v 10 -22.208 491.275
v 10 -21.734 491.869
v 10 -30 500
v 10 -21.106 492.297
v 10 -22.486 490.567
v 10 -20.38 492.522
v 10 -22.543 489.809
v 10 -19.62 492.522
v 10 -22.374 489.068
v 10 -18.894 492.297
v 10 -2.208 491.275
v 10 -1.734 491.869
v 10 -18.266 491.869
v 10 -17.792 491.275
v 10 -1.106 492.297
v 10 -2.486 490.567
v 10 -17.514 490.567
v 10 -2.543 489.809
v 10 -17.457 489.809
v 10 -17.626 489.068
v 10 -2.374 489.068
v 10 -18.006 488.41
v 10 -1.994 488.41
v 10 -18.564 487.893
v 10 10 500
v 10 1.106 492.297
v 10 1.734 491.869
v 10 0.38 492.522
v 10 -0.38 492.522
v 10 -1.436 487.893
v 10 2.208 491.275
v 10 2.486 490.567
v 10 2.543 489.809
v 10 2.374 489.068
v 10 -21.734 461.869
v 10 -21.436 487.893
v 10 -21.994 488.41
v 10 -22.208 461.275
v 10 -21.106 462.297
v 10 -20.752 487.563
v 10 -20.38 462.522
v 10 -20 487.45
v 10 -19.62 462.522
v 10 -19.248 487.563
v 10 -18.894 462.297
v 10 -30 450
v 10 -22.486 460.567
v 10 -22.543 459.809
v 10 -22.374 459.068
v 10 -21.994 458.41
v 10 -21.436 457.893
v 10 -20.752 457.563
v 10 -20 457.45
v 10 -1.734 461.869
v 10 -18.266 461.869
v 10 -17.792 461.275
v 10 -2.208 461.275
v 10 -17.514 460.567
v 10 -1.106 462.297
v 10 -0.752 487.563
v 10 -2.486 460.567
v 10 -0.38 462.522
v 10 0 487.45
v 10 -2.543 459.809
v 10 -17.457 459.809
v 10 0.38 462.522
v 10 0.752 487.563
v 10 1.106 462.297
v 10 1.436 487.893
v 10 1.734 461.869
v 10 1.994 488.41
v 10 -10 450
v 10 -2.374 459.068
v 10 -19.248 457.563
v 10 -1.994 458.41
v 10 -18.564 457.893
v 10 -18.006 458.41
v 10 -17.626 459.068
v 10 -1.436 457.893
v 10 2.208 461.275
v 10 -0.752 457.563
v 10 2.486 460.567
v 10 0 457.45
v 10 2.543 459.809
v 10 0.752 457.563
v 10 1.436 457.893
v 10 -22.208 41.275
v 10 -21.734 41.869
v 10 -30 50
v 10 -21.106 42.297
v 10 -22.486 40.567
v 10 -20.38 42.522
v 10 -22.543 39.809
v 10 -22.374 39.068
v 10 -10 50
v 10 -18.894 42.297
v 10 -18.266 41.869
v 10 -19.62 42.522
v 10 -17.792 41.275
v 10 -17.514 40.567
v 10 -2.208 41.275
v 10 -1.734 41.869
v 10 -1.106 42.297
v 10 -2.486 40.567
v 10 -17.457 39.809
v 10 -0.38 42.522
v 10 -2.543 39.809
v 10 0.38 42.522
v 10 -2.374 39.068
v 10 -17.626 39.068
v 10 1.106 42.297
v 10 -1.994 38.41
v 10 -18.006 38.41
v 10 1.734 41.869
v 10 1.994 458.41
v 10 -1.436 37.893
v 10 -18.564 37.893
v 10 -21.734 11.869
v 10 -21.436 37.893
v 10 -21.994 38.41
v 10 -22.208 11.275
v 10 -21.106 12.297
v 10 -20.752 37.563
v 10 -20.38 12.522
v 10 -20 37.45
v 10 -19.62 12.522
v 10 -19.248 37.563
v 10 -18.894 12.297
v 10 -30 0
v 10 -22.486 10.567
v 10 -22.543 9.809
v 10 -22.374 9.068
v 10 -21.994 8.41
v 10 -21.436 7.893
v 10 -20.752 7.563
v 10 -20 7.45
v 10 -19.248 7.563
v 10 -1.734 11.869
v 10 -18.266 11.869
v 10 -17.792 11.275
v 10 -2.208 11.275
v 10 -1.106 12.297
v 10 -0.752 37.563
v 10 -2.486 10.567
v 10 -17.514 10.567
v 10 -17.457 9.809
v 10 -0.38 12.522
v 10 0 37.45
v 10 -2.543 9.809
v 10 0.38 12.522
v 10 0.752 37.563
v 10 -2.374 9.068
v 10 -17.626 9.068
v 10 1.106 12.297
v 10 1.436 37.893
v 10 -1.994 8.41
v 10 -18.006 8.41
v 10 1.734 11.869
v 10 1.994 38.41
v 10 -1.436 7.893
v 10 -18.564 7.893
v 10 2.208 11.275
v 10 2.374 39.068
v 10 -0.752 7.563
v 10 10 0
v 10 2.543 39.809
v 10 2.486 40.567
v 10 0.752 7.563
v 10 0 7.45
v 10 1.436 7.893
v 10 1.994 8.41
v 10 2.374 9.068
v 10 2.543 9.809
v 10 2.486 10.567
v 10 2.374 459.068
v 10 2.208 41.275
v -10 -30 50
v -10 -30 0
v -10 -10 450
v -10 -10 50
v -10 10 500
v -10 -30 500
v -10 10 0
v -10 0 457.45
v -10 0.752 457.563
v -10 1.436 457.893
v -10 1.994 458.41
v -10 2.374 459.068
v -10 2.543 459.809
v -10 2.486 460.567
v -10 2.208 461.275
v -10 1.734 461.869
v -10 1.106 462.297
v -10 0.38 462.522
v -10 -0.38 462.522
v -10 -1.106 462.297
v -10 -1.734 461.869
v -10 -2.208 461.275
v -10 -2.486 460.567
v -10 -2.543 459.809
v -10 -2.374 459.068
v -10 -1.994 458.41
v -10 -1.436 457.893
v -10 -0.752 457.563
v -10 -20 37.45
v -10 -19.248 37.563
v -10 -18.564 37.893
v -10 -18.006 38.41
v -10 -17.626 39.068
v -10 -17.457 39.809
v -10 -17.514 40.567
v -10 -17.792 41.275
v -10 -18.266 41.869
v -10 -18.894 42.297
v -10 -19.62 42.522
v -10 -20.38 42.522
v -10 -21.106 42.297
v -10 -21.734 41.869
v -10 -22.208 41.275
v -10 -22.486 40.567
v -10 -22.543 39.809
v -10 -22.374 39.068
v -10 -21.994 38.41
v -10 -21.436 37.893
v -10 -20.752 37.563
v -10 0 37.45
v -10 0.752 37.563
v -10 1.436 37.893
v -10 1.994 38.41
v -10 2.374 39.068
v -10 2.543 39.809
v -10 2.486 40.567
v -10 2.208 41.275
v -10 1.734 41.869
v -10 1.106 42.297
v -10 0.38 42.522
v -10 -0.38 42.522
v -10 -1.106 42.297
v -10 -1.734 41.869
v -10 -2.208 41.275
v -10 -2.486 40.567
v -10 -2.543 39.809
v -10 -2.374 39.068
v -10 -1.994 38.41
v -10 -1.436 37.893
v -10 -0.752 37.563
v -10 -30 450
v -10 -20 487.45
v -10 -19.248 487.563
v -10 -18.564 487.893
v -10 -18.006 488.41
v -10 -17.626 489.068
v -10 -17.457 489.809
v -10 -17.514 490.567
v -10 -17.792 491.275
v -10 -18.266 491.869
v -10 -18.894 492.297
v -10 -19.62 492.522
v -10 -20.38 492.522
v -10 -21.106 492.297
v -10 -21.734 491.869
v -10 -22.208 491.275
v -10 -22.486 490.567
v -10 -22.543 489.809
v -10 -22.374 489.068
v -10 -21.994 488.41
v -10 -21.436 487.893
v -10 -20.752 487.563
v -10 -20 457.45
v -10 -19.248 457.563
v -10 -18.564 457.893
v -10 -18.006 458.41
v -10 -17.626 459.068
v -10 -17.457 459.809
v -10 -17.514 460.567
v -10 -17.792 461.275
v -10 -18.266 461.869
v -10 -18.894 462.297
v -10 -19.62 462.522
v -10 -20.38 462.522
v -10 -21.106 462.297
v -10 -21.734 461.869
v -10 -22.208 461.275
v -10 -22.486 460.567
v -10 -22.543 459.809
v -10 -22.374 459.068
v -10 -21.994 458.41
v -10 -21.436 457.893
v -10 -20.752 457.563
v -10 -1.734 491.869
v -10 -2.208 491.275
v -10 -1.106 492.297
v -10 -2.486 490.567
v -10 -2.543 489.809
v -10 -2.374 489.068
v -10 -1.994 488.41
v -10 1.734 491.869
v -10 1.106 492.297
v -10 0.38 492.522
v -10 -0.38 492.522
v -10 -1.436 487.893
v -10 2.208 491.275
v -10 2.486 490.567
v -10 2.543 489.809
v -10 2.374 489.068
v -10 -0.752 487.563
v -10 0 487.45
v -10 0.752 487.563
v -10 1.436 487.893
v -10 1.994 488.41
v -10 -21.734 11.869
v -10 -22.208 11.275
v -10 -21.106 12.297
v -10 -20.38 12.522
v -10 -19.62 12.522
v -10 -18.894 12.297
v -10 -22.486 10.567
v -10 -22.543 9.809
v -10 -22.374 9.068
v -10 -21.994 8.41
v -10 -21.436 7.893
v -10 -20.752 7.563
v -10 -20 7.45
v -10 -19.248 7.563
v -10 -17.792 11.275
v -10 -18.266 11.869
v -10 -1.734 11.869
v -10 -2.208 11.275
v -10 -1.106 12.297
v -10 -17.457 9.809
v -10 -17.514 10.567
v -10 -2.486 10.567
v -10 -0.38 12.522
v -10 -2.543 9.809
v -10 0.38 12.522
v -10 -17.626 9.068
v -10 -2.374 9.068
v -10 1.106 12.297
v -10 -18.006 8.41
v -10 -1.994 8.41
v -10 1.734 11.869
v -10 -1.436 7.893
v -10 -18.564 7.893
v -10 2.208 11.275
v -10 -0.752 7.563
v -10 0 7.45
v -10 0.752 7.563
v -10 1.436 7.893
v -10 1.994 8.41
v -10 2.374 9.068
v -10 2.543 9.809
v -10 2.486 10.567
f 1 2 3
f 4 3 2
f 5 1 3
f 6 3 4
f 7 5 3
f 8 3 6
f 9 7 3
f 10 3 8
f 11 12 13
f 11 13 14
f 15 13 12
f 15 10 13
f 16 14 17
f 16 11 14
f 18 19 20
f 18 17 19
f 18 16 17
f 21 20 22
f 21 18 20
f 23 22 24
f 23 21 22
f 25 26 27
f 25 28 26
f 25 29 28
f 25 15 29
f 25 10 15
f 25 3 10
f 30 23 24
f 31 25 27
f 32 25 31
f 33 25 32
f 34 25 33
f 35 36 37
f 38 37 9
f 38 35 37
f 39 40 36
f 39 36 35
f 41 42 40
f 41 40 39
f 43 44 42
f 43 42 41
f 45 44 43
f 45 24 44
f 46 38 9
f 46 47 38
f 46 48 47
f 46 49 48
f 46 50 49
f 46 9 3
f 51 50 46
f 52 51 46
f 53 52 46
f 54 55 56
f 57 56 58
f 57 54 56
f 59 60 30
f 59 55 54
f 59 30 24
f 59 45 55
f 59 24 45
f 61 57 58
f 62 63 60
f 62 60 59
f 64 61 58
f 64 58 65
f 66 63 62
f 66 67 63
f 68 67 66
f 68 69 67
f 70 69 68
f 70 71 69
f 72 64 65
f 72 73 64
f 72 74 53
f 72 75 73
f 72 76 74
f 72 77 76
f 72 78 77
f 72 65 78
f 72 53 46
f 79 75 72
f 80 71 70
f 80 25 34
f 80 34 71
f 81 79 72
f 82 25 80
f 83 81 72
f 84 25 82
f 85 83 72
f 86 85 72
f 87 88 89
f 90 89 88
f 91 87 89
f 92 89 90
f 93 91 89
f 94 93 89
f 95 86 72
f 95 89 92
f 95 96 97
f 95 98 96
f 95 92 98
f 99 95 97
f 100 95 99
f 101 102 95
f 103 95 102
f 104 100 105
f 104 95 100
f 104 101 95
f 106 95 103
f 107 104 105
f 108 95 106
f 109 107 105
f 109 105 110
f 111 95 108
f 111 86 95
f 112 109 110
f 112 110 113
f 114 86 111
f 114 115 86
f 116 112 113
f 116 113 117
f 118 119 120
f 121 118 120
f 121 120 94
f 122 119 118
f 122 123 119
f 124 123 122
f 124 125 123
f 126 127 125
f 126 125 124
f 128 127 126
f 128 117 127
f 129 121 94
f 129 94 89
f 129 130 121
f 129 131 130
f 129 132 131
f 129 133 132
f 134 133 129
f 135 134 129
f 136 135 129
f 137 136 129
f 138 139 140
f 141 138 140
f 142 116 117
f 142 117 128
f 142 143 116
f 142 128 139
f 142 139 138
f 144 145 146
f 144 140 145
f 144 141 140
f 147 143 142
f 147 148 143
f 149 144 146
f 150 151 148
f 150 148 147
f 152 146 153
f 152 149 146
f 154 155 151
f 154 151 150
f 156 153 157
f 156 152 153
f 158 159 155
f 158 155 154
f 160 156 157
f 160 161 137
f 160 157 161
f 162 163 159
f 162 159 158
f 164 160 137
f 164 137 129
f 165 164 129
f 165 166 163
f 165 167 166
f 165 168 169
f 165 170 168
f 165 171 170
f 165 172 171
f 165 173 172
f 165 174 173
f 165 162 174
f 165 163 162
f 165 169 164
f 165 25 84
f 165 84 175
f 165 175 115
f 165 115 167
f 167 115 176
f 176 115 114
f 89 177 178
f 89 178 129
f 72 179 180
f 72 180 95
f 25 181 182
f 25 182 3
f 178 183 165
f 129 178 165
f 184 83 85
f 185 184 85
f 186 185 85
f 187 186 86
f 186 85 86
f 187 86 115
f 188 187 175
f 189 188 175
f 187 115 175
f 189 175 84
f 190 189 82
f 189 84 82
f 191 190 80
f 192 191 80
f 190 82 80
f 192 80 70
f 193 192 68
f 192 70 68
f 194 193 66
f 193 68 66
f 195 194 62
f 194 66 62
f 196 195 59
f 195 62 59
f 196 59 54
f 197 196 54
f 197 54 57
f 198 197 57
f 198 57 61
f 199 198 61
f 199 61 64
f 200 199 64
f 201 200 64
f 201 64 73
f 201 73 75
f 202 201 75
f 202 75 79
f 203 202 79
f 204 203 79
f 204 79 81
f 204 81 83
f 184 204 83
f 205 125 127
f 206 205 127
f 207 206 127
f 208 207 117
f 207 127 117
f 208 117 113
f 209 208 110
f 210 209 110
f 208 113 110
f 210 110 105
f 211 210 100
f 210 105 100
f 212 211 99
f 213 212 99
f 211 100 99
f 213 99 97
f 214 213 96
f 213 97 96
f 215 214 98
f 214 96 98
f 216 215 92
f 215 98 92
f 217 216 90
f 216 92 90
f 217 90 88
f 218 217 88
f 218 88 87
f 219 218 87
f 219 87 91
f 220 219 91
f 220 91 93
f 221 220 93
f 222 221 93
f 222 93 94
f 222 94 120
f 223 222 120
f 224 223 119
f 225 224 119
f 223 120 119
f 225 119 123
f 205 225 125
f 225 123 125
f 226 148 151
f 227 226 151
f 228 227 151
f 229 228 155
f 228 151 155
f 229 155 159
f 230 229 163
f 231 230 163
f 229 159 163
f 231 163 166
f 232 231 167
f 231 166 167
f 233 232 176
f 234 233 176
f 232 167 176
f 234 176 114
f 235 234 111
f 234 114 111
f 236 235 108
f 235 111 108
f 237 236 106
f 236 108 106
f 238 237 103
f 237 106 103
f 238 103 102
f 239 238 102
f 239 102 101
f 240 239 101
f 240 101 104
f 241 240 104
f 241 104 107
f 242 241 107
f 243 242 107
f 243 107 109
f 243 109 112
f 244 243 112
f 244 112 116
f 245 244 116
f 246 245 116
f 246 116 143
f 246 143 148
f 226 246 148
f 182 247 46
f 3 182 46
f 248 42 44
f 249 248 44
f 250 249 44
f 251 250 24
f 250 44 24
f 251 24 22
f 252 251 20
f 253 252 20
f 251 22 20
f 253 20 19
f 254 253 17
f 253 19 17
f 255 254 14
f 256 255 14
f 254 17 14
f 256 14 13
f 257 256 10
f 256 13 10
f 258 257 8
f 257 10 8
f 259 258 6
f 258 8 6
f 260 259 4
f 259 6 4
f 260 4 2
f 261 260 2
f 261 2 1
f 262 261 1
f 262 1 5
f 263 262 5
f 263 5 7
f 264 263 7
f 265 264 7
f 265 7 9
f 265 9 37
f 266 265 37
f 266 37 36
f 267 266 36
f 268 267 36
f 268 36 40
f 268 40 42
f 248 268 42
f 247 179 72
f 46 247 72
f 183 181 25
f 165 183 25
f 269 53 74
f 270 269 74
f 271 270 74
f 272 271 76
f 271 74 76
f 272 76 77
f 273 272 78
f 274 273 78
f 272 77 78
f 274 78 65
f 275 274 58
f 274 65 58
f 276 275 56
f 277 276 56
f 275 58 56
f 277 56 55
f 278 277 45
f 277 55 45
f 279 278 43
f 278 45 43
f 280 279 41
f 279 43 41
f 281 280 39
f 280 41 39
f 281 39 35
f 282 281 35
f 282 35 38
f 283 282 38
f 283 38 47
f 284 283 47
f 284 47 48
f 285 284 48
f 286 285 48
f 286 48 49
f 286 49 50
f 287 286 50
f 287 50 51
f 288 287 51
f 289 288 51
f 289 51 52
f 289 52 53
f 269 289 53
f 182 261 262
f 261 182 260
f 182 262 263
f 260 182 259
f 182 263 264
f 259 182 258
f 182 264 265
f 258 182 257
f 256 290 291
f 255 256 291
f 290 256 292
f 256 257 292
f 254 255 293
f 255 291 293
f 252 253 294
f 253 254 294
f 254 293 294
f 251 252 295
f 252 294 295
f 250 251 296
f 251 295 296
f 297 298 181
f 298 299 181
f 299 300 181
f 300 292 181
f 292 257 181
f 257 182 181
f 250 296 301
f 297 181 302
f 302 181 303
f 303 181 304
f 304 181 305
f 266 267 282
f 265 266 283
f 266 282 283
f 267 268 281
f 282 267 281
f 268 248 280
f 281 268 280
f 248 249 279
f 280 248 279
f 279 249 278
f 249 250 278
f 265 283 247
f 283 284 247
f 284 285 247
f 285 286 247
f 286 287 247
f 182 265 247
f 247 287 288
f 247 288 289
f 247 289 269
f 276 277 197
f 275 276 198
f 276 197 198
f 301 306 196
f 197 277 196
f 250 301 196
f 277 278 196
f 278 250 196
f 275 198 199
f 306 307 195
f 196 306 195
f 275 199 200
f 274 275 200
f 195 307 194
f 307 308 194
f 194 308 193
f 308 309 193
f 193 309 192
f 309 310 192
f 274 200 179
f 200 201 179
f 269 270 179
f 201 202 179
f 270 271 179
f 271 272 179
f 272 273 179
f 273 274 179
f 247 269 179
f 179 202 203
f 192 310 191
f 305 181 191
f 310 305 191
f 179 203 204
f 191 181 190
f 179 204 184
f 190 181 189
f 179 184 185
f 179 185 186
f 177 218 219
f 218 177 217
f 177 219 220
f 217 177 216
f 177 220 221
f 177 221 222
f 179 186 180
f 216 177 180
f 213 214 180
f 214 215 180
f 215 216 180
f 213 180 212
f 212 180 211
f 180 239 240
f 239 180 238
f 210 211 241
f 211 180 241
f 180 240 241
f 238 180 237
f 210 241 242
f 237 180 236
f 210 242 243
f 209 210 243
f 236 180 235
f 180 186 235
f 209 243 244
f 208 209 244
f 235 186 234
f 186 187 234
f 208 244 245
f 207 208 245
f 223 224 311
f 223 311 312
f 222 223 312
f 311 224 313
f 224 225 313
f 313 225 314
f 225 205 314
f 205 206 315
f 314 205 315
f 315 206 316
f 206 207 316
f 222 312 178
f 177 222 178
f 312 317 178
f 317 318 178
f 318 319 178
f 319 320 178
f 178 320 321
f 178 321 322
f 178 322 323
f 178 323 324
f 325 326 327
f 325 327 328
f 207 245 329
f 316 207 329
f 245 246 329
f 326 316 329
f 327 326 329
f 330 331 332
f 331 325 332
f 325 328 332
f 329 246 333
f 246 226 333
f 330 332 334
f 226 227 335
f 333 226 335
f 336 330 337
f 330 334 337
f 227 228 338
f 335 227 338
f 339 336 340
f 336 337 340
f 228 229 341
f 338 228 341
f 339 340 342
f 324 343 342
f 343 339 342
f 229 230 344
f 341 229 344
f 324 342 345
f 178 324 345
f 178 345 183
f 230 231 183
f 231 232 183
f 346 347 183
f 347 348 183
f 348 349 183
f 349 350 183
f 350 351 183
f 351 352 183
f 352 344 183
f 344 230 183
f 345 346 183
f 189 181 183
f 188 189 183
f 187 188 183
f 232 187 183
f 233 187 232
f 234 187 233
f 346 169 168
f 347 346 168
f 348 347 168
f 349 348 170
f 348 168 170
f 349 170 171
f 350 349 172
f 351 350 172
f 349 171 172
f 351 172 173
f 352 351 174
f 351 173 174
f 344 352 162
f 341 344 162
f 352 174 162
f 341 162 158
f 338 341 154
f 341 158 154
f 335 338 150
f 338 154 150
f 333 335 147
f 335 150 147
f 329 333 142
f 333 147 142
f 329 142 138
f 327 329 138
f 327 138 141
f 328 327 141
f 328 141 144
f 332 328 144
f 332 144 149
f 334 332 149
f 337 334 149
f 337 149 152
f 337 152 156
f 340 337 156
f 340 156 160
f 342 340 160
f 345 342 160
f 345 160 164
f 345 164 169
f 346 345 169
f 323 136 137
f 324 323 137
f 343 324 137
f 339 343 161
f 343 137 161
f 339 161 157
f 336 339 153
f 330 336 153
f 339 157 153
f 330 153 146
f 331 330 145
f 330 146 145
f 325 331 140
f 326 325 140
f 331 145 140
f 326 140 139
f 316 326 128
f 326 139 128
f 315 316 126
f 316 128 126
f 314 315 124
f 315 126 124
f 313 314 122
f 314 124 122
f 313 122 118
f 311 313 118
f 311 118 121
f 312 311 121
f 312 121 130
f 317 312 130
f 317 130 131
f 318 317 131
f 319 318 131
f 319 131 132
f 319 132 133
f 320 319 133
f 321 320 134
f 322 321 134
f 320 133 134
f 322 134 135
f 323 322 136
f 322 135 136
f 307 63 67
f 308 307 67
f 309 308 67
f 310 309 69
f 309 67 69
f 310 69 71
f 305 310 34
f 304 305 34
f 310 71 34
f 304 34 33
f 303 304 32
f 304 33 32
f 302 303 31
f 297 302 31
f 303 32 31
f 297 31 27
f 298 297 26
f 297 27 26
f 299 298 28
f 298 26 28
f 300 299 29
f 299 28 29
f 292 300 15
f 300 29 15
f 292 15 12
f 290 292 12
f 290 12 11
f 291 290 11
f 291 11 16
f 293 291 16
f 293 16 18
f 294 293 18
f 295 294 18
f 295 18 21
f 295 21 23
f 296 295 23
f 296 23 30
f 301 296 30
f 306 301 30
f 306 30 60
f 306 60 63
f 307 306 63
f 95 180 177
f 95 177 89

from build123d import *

# Parameters (mm, degrees)
SKETCH_1_W          = 20
SKETCH_1_H          = 20
EXTRUDE_2_DEPTH     = 500
CUT_EXTRUDE_1_REACH = 502.5
SKETCH_2_R          = 2.55
SKETCH_3_W          = 20
SKETCH_3_H          = 50
EXTRUDE_3_DEPTH     = 20
SKETCH_4_R          = 2.55
CUT_EXTRUDE_2_DEPTH = 20
SKETCH_5_W          = 20
SKETCH_5_H          = 20
CUT_EXTRUDE_3_DEPTH = 250
CUT_EXTRUDE_4_REACH = 503.298
SKETCH_6_R          = 2.55


with BuildPart() as part:
    # 草图1 → 凸台-拉伸2 (new body)
    with BuildSketch(Plane.XY):
        Rectangle(SKETCH_1_W, SKETCH_1_H)
    extrude_2 = extrude(amount=EXTRUDE_2_DEPTH)

    # 草图2 → 切除-拉伸1 (cut, up to next)
    with BuildSketch(Plane(origin=(10, 0, 0), x_dir=(0, 0, -1), z_dir=(1, 0, 0)), mode=Mode.PRIVATE) as cut_extrude_1_sk1:
        with Locations((-10, 0)):
            Circle(SKETCH_2_R)
    cut_extrude_1_tool1 = extrude(cut_extrude_1_sk1.sketch, amount=-CUT_EXTRUDE_1_REACH, mode=Mode.PRIVATE) & part.part
    # 草图2 → 切除-拉伸1 (cut, up to next)
    with BuildSketch(Plane(origin=(10, 0, 0), x_dir=(0, 0, -1), z_dir=(1, 0, 0)), mode=Mode.PRIVATE) as cut_extrude_1_sk2:
        with Locations((-40, 0)):
            Circle(SKETCH_2_R)
    cut_extrude_1_tool2 = extrude(cut_extrude_1_sk2.sketch, amount=-CUT_EXTRUDE_1_REACH, mode=Mode.PRIVATE) & part.part
    add(cut_extrude_1_tool1.solids().sort_by_distance((10, 0, 10))[0], mode=Mode.SUBTRACT)
    add(cut_extrude_1_tool2.solids().sort_by_distance((10, 0, 40))[0], mode=Mode.SUBTRACT)

    # 草图3 → 凸台-拉伸3 (add)
    with BuildSketch(Plane.XZ.offset(10)):
        with Locations((0, 25)):
            Rectangle(SKETCH_3_W, SKETCH_3_H)
    extrude_3 = extrude(amount=EXTRUDE_3_DEPTH)

    # 草图4 → 切除-拉伸2 (cut)
    with BuildSketch(Plane(origin=(10, 0, 0), x_dir=(0, 0, -1), z_dir=(1, 0, 0))):
        with Locations((-40, -20)):
            Circle(SKETCH_4_R)
        with Locations((-10, -20)):
            Circle(SKETCH_4_R)
    extrude(amount=-CUT_EXTRUDE_2_DEPTH, mode=Mode.SUBTRACT)

    # 草图5 → 切除-拉伸3 (cut)
    with BuildSketch(Plane.XY.offset(500)):
        Rectangle(SKETCH_5_W, SKETCH_5_H)
    extrude(amount=-CUT_EXTRUDE_3_DEPTH, mode=Mode.SUBTRACT)

    # 镜向2: 凸台-拉伸2, 凸台-拉伸3 across plane
    add(extrude_2.mirror(Plane(origin=(0, 0, 250), x_dir=(1, 0, 0), z_dir=(0, 0, -1))))
    add(extrude_3.mirror(Plane(origin=(0, 0, 250), x_dir=(1, 0, 0), z_dir=(0, 0, -1))))

    # 草图6 → 切除-拉伸4 (cut, up to next)
    with BuildSketch(Plane(origin=(10, 0, 0), x_dir=(0, 0, -1), z_dir=(1, 0, 0)), mode=Mode.PRIVATE) as cut_extrude_4_sk1:
        with Locations((-490, 0)):
            Circle(SKETCH_6_R)
    cut_extrude_4_tool1 = extrude(cut_extrude_4_sk1.sketch, amount=-CUT_EXTRUDE_4_REACH, mode=Mode.PRIVATE) & part.part
    # 草图6 → 切除-拉伸4 (cut, up to next)
    with BuildSketch(Plane(origin=(10, 0, 0), x_dir=(0, 0, -1), z_dir=(1, 0, 0)), mode=Mode.PRIVATE) as cut_extrude_4_sk2:
        with Locations((-460, 0)):
            Circle(SKETCH_6_R)
    cut_extrude_4_tool2 = extrude(cut_extrude_4_sk2.sketch, amount=-CUT_EXTRUDE_4_REACH, mode=Mode.PRIVATE) & part.part
    # 草图6 → 切除-拉伸4 (cut, up to next)
    with BuildSketch(Plane(origin=(10, 0, 0), x_dir=(0, 0, -1), z_dir=(1, 0, 0)), mode=Mode.PRIVATE) as cut_extrude_4_sk3:
        with Locations((-460, -20)):
            Circle(SKETCH_6_R)
    cut_extrude_4_tool3 = extrude(cut_extrude_4_sk3.sketch, amount=-CUT_EXTRUDE_4_REACH, mode=Mode.PRIVATE) & part.part
    # 草图6 → 切除-拉伸4 (cut, up to next)
    with BuildSketch(Plane(origin=(10, 0, 0), x_dir=(0, 0, -1), z_dir=(1, 0, 0)), mode=Mode.PRIVATE) as cut_extrude_4_sk4:
        with Locations((-490, -20)):
            Circle(SKETCH_6_R)
    cut_extrude_4_tool4 = extrude(cut_extrude_4_sk4.sketch, amount=-CUT_EXTRUDE_4_REACH, mode=Mode.PRIVATE) & part.part
    # 草图6 → 切除-拉伸4 (cut, up to next)
    with BuildSketch(Plane(origin=(10, 0, 0), x_dir=(0, 0, -1), z_dir=(1, 0, 0)), mode=Mode.PRIVATE) as cut_extrude_4_sk5:
        with Locations((-10, 0)):
            Circle(SKETCH_6_R)
    cut_extrude_4_tool5 = extrude(cut_extrude_4_sk5.sketch, amount=-CUT_EXTRUDE_4_REACH, mode=Mode.PRIVATE) & part.part
    # 草图6 → 切除-拉伸4 (cut, up to next)
    with BuildSketch(Plane(origin=(10, 0, 0), x_dir=(0, 0, -1), z_dir=(1, 0, 0)), mode=Mode.PRIVATE) as cut_extrude_4_sk6:
        with Locations((-40, 0)):
            Circle(SKETCH_6_R)
    cut_extrude_4_tool6 = extrude(cut_extrude_4_sk6.sketch, amount=-CUT_EXTRUDE_4_REACH, mode=Mode.PRIVATE) & part.part
    add(cut_extrude_4_tool1.solids().sort_by_distance((10, 0, 490))[0], mode=Mode.SUBTRACT)
    add(cut_extrude_4_tool2.solids().sort_by_distance((10, 0, 460))[0], mode=Mode.SUBTRACT)
    add(cut_extrude_4_tool3.solids().sort_by_distance((10, -20, 460))[0], mode=Mode.SUBTRACT)
    add(cut_extrude_4_tool4.solids().sort_by_distance((10, -20, 490))[0], mode=Mode.SUBTRACT)
    add(cut_extrude_4_tool5.solids().sort_by_distance((10, 0, 10))[0], mode=Mode.SUBTRACT)
    add(cut_extrude_4_tool6.solids().sort_by_distance((10, 0, 40))[0], mode=Mode.SUBTRACT)


solid = part.part
